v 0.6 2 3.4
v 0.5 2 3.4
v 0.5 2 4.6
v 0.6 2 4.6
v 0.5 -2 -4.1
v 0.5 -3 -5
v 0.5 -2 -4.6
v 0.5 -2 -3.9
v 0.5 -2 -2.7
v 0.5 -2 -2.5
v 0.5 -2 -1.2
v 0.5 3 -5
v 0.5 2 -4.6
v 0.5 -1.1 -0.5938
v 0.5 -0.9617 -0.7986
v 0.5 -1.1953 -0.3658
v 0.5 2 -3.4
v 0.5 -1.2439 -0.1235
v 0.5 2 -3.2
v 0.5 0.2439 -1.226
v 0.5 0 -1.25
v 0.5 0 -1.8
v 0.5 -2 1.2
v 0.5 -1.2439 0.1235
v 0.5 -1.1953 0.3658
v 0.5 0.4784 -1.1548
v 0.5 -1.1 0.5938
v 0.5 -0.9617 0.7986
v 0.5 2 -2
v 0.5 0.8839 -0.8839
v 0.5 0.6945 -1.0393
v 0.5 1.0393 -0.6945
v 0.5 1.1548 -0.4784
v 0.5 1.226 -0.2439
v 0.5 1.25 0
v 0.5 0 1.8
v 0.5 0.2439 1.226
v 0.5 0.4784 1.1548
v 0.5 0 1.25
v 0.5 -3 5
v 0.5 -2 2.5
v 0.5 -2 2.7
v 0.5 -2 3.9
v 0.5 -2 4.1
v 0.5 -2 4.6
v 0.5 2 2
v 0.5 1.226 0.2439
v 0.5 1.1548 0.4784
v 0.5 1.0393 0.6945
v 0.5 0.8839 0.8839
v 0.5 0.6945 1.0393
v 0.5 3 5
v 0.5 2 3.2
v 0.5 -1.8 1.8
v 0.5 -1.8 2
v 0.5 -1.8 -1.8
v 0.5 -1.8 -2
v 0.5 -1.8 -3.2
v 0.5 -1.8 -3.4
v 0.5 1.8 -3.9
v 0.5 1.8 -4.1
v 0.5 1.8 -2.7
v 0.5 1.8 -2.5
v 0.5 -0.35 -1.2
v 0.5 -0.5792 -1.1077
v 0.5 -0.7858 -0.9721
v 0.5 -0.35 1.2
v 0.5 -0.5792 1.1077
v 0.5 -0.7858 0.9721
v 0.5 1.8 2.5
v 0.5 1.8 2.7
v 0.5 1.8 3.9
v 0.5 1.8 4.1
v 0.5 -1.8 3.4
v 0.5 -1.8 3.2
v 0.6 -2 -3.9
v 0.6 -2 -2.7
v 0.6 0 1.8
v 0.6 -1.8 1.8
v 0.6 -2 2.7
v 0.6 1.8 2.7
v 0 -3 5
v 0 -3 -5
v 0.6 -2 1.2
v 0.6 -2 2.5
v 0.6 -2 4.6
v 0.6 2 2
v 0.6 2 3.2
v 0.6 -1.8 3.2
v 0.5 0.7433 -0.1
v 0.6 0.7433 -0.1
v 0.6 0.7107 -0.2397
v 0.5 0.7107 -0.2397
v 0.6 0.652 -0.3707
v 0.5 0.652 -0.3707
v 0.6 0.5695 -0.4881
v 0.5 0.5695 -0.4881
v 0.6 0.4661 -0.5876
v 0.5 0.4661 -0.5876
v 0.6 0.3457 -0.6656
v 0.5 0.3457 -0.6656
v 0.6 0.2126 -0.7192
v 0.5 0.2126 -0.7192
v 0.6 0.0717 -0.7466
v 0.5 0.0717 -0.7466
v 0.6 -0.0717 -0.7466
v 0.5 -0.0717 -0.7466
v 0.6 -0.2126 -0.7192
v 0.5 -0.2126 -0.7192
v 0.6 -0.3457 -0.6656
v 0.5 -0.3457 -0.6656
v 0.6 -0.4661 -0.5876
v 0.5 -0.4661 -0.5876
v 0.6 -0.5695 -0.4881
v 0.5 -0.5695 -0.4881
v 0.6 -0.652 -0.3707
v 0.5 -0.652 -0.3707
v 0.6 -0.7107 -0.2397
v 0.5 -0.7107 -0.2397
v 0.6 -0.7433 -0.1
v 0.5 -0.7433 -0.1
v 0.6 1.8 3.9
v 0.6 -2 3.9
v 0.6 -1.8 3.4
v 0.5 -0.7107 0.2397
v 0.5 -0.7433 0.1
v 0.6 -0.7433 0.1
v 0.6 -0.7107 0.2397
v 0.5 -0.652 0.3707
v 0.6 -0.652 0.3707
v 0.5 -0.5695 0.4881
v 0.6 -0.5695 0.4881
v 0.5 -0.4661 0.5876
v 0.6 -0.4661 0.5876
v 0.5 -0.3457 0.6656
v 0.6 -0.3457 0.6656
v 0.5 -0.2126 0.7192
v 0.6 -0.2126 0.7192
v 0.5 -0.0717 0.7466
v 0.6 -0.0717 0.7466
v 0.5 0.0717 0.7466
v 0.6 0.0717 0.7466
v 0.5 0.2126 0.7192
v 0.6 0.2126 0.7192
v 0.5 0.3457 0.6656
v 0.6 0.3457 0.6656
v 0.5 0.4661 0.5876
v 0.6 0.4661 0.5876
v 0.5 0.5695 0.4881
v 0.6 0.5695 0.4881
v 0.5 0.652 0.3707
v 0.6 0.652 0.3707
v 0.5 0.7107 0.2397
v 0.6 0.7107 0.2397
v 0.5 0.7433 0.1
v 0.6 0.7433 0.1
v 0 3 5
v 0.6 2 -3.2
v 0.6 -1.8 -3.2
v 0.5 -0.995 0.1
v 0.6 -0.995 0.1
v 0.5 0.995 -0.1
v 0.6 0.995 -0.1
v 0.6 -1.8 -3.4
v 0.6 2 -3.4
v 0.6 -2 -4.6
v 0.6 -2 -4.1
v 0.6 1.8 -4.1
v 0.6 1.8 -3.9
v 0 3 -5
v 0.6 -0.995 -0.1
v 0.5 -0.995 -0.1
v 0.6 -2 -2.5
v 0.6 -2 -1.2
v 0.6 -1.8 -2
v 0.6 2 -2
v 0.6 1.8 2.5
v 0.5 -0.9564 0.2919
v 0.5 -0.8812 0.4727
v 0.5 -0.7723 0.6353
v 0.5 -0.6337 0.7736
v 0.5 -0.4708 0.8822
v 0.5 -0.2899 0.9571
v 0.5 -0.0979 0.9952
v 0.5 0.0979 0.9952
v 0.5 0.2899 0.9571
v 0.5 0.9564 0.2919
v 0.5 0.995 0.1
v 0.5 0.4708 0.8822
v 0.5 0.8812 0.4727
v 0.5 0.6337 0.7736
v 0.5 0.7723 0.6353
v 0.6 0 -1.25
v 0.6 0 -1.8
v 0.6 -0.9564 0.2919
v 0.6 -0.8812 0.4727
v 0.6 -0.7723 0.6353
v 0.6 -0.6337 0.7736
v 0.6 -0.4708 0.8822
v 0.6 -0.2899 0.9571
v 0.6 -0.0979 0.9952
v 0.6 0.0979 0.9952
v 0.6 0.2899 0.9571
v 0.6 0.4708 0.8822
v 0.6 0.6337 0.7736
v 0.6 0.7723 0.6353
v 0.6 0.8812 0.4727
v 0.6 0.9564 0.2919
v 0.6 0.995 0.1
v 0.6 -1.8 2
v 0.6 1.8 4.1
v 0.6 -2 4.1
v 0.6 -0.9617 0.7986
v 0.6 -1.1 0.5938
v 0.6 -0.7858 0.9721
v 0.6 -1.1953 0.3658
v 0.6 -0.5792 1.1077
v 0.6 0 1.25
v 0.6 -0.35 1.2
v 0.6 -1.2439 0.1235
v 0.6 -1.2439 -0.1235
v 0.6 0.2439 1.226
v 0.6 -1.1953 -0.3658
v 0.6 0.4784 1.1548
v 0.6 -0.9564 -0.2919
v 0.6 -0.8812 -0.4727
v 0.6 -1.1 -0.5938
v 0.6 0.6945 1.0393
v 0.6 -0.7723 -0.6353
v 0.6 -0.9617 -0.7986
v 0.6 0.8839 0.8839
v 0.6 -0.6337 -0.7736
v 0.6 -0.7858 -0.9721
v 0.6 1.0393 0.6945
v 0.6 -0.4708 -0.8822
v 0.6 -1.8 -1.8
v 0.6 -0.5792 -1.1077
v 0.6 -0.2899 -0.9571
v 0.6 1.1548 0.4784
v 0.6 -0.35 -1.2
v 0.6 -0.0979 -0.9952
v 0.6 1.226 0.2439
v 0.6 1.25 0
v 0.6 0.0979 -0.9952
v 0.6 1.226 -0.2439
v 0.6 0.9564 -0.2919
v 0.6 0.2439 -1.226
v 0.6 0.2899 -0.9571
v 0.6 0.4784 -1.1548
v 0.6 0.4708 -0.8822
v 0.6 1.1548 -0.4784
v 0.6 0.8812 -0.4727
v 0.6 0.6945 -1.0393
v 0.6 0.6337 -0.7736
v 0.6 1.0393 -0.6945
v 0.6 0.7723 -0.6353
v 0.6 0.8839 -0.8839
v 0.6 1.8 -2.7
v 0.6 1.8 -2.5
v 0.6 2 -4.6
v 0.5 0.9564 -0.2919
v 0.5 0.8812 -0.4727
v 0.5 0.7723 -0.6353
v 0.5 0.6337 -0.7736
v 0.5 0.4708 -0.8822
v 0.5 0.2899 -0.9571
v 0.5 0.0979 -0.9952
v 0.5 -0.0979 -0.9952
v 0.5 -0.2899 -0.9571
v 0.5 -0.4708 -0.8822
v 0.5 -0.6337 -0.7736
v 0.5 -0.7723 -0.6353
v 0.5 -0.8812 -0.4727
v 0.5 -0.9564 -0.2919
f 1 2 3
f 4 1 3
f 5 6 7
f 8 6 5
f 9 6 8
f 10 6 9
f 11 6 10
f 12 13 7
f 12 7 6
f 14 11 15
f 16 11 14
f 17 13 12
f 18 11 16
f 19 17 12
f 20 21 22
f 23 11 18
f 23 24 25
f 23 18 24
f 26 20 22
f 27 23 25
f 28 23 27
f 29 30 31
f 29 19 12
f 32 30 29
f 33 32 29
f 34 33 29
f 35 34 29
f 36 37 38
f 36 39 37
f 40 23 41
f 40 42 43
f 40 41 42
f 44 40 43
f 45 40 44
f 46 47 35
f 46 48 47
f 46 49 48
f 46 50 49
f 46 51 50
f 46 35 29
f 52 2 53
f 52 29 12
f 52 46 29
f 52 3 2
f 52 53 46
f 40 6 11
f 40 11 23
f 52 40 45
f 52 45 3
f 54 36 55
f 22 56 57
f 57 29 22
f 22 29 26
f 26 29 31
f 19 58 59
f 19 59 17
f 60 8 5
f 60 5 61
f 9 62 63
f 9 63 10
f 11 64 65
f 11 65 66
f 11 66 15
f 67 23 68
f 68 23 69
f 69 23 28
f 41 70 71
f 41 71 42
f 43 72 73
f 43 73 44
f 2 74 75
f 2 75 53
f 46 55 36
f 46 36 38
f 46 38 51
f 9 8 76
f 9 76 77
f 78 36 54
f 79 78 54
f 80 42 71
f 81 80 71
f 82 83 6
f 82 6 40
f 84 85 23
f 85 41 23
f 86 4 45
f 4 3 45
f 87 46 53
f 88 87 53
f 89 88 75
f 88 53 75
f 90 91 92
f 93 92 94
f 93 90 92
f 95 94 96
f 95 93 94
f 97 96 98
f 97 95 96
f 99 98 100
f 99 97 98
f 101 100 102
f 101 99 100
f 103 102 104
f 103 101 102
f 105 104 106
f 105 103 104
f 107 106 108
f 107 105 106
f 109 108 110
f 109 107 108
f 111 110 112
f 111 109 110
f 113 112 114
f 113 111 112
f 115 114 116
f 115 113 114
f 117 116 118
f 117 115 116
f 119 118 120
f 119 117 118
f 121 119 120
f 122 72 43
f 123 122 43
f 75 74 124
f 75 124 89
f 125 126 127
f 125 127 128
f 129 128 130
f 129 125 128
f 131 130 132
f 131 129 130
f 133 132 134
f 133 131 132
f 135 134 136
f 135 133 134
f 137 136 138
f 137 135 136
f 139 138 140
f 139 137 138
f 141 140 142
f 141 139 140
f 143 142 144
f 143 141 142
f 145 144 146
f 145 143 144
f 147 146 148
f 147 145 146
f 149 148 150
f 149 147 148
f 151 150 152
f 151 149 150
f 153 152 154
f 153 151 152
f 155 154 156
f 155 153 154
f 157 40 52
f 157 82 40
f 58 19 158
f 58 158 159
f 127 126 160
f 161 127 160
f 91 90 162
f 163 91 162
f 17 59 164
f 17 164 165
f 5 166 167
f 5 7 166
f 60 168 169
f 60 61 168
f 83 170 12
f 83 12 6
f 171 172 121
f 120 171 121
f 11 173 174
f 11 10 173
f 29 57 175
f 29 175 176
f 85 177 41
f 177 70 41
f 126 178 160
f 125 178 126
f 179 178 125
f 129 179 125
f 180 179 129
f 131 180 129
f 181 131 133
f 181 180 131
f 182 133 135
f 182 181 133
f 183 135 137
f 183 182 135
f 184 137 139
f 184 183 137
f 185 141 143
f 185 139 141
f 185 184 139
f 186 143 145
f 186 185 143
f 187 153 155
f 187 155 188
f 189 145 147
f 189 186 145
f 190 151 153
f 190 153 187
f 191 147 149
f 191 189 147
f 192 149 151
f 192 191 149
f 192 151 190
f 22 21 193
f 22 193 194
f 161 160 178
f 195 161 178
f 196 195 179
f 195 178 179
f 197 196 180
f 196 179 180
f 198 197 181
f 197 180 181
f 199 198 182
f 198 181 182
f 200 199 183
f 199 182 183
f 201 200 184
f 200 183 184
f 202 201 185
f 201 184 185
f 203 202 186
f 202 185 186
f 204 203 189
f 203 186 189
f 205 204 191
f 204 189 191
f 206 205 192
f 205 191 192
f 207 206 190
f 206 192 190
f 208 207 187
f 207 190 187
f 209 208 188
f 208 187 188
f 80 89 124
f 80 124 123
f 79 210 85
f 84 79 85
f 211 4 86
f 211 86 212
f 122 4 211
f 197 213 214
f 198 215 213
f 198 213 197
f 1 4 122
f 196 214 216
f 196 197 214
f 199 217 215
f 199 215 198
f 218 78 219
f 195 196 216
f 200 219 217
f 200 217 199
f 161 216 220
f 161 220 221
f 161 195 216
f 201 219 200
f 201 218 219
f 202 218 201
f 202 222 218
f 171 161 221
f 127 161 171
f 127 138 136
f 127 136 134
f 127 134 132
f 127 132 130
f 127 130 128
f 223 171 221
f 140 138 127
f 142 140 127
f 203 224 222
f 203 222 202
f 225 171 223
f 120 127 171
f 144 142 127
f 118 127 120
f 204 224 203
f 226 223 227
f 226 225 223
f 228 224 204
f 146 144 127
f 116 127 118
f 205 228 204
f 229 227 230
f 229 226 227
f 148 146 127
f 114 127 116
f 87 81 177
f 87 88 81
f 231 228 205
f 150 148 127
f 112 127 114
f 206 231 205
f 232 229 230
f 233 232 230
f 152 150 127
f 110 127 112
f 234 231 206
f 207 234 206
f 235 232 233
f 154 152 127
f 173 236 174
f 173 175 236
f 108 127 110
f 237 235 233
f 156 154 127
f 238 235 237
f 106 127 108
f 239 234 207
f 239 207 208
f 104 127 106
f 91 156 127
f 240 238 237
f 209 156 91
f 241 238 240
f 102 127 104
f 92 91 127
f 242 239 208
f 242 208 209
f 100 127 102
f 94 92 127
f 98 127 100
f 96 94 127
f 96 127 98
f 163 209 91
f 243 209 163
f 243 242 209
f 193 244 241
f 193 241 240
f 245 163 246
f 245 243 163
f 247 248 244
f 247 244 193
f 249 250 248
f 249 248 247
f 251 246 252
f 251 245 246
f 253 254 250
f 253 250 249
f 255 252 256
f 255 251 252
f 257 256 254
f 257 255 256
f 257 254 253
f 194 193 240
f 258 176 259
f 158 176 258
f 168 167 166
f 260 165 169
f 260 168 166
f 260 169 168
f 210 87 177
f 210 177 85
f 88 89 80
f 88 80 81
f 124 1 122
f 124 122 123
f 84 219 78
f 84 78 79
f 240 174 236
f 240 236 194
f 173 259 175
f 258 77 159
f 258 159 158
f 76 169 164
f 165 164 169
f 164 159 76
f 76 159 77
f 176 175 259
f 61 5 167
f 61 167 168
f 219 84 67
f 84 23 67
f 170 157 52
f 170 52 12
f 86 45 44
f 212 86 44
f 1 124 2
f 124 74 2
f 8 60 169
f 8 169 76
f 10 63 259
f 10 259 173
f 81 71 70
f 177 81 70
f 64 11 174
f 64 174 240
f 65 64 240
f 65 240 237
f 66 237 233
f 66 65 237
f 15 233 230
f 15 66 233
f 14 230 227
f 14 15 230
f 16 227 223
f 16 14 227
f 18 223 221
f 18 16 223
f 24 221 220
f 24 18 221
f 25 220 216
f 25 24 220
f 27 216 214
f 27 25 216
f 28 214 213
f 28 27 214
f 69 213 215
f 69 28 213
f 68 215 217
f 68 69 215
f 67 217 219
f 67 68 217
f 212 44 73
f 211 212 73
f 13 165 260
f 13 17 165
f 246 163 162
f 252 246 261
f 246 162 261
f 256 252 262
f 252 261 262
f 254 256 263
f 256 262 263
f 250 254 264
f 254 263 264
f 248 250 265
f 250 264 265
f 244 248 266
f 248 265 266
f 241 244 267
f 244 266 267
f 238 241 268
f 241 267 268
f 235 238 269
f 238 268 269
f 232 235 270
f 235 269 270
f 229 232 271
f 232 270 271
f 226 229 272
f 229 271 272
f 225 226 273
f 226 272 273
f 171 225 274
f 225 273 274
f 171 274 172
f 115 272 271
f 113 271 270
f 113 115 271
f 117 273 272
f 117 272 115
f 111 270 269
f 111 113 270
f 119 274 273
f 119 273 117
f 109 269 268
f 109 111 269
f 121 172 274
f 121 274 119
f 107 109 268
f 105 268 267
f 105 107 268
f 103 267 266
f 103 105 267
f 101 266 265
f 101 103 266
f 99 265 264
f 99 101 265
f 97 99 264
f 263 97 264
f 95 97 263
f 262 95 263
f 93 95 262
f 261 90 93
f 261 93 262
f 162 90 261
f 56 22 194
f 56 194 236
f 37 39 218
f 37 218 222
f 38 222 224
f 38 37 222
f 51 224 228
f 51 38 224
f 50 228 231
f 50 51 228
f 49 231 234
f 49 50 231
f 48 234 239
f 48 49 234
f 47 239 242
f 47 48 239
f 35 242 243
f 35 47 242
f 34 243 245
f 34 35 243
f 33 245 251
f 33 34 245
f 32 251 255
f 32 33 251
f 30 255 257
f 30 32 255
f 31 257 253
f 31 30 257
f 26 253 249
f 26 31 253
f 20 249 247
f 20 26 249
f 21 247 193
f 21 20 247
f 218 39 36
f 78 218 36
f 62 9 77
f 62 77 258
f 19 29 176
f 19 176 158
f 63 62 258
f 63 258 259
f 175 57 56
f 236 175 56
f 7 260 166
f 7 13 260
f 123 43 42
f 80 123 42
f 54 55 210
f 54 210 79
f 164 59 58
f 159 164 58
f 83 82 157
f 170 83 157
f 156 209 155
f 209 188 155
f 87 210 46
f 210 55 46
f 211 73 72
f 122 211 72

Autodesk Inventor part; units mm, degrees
ref_plane "YZ Plane" through (0, 0, 0) normal (1, 0, 0) x (0, 1, 0)
ref_plane "XZ Plane" through (0, 0, 0) normal (0, 1, 0) x (-1, 0, 0)
ref_plane "XY Plane" through (0, 0, 0) normal (0, 0, 1) x (1, 0, 0)
sketch "Sketch1" plane through (0, 0, 0) normal (1, 0, 0) x (0, 1, 0)
  line L0 (-3, 5) -> (3, 5)
  line L1 (3, 5) -> (3, -5)
  line L2 (3, -5) -> (-3, -5)
  line L3 (-3, -5) -> (-3, 5)
  point P0 (0, 0)
  dimension "d0" = 6
  dimension "d1" = 10
  dimension "d2" = 3
  dimension "d3" = 5
extrude "Extrusion1" add sketch "Sketch1" along normal blind 0.5
sketch "Sketch2" plane through (0.5, 0, 0) normal (1, 0, 0) x (0, 0, -1)
  circle A0 centre (0, 0) radius 0.75
  circle A1 centre (0, 0) radius 1
  circle A2 centre (0, 0) radius 1.25
  line L0 (-2.5, -2) -> (-2, -2)
  line L1 (-2, -2) -> (-2, 2)
  line L2 (-2, 2) -> (-2.5, 2)
  line L3 (-2.5, 2) -> (-2.5, -2)
  line L4 (-5, -3) -> (5, -3) projected
  line L5 (-3.2, -2) -> (-2.7, -2)
  line L6 (-2.7, -2) -> (-2.7, 2)
  line L7 (-2.7, 2) -> (-3.2, 2)
  line L8 (-3.2, 2) -> (-3.2, -2)
  line L9 (-3.9, -2) -> (-3.4, -2)
  line L10 (-3.4, -2) -> (-3.4, 2)
  line L11 (-3.4, 2) -> (-3.9, 2)
  line L12 (-3.9, 2) -> (-3.9, -2)
  line L13 (-4.6, -2) -> (-4.1, -2)
  line L14 (-4.1, -2) -> (-4.1, 2)
  line L15 (-4.1, 2) -> (-4.6, 2)
  line L16 (-4.6, 2) -> (-4.6, -2)
  line L17 (-0.1, -1.1173) -> (0.1, -1.1173)
  line L18 (0.1, -1.1173) -> (0.1, 1.1584)
  line L19 (0.1, 1.1584) -> (-0.1, 1.1584)
  line L20 (-0.1, 1.1584) -> (-0.1, -1.1173)
  line L21 (-1.8, -2) -> (-1.2, -2)
  line L22 (-1.2, -2) -> (-1.2, 0)
  line L23 (-1.2, 0) -> (-1.8, 0)
  line L24 (-1.8, 0) -> (-1.8, -2)
  line L25 (-1.8, -2) -> (-2, -2)
  line L26 (-2, -2) -> (-2, -1.8)
  line L27 (-2, -1.8) -> (-1.8, -1.8)
  line L28 (-1.8, -1.8) -> (-1.8, -2)
  line L29 (-2.5, 2) -> (-2.7, 2)
  line L30 (-2.7, 2) -> (-2.7, 1.8)
  line L31 (-2.7, 1.8) -> (-2.5, 1.8)
  line L32 (-2.5, 1.8) -> (-2.5, 2)
  line L33 (-3.2, -2) -> (-3.4, -2)
  line L34 (-3.4, -2) -> (-3.4, -1.8)
  line L35 (-3.4, -1.8) -> (-3.2, -1.8)
  line L36 (-3.2, -1.8) -> (-3.2, -2)
  line L37 (-3.9, 2) -> (-4.1, 2)
  line L38 (-4.1, 2) -> (-4.1, 1.8)
  line L39 (-4.1, 1.8) -> (-3.9, 1.8)
  line L40 (-3.9, 1.8) -> (-3.9, 2)
  line L41 (0, -3) -> (0, -2)
  circle A3 centre (0, 0) radius 0.75
  circle A4 centre (0, 0) radius 1
  circle A5 centre (0, 0) radius 1.25
  line L42 (2.5, -2) -> (2, -2)
  line L43 (2, -2) -> (2, 2)
  line L44 (2, 2) -> (2.5, 2)
  line L45 (2.5, 2) -> (2.5, -2)
  line L46 (3.2, -2) -> (2.7, -2)
  line L47 (2.7, -2) -> (2.7, 2)
  line L48 (2.7, 2) -> (3.2, 2)
  line L49 (3.2, 2) -> (3.2, -2)
  line L50 (3.9, -2) -> (3.4, -2)
  line L51 (3.4, -2) -> (3.4, 2)
  line L52 (3.4, 2) -> (3.9, 2)
  line L53 (3.9, 2) -> (3.9, -2)
  line L54 (4.6, -2) -> (4.1, -2)
  line L55 (4.1, -2) -> (4.1, 2)
  line L56 (4.1, 2) -> (4.6, 2)
  line L57 (4.6, 2) -> (4.6, -2)
  line L58 (0.1, -1.1173) -> (-0.1, -1.1173)
  line L59 (-0.1, -1.1173) -> (-0.1, 1.1584)
  line L60 (-0.1, 1.1584) -> (0.1, 1.1584)
  line L61 (0.1, 1.1584) -> (0.1, -1.1173)
  line L62 (1.8, -2) -> (1.2, -2)
  line L63 (1.2, -2) -> (1.2, 0)
  line L64 (1.2, 0) -> (1.8, 0)
  line L65 (1.8, 0) -> (1.8, -2)
  line L66 (1.8, -2) -> (2, -2)
  line L67 (2, -2) -> (2, -1.8)
  line L68 (2, -1.8) -> (1.8, -1.8)
  line L69 (1.8, -1.8) -> (1.8, -2)
  line L70 (2.5, 2) -> (2.7, 2)
  line L71 (2.7, 2) -> (2.7, 1.8)
  line L72 (2.7, 1.8) -> (2.5, 1.8)
  line L73 (2.5, 1.8) -> (2.5, 2)
  line L74 (3.2, -2) -> (3.4, -2)
  line L75 (3.4, -2) -> (3.4, -1.8)
  line L76 (3.4, -1.8) -> (3.2, -1.8)
  line L77 (3.2, -1.8) -> (3.2, -2)
  line L78 (3.9, 2) -> (4.1, 2)
  line L79 (4.1, 2) -> (4.1, 1.8)
  line L80 (4.1, 1.8) -> (3.9, 1.8)
  line L81 (3.9, 1.8) -> (3.9, 2)
  dimension "d6" = 1.5
  dimension "d7" = 2
  dimension "d8" = 2.5
  dimension "d9" = 0.5
  dimension "d10" = 4
  dimension "d11" = 1
  dimension "d14" = 0.7
  dimension "d19" = 0.2
  dimension "d20" = 0.1
  dimension "d21" = 2
  dimension "d22" = 0.6
  dimension "d23" = 2
  dimension "d24" = 0.2
  dimension "d25" = 0.2
  dimension "d26" = 0.2
  dimension "d27" = 0.2
  dimension "d28" = 0.2
extrude "Extrusion2" add sketch "Sketch2" along normal blind 0.1 contours A0 L18 | L18 A0 L20 | A0 L20 A1 L18 | L18 A1 L20 A0 | L20 A0 | A1 L20 L19 L18 | L18 L17 L20 A1 | L64 L63 A2 L22 L23 | L64 L65 L62 L63 A2 | A2 L63 L64 | L23 L22 A2 | A2 L22 L21 L24 L23 | L68 L43 L66 L65 | L24 L25 L1 L27 | L43 L44 L45 L42 | L1 L0 L3 L2 | L70 L47 L72 L45 | L3 L31 L6 L29 | L48 L49 L46 L47 | L6 L5 L8 L7 | L76 L51 L74 L49 | L8 L33 L10 L35 | L51 L52 L53 L50 | L10 L9 L12 L11 | L78 L55 L80 L53 | L12 L39 L14 L37 | L56 L57 L54 L55 | L14 L13 L16 L15
properties part number "MEMS"
